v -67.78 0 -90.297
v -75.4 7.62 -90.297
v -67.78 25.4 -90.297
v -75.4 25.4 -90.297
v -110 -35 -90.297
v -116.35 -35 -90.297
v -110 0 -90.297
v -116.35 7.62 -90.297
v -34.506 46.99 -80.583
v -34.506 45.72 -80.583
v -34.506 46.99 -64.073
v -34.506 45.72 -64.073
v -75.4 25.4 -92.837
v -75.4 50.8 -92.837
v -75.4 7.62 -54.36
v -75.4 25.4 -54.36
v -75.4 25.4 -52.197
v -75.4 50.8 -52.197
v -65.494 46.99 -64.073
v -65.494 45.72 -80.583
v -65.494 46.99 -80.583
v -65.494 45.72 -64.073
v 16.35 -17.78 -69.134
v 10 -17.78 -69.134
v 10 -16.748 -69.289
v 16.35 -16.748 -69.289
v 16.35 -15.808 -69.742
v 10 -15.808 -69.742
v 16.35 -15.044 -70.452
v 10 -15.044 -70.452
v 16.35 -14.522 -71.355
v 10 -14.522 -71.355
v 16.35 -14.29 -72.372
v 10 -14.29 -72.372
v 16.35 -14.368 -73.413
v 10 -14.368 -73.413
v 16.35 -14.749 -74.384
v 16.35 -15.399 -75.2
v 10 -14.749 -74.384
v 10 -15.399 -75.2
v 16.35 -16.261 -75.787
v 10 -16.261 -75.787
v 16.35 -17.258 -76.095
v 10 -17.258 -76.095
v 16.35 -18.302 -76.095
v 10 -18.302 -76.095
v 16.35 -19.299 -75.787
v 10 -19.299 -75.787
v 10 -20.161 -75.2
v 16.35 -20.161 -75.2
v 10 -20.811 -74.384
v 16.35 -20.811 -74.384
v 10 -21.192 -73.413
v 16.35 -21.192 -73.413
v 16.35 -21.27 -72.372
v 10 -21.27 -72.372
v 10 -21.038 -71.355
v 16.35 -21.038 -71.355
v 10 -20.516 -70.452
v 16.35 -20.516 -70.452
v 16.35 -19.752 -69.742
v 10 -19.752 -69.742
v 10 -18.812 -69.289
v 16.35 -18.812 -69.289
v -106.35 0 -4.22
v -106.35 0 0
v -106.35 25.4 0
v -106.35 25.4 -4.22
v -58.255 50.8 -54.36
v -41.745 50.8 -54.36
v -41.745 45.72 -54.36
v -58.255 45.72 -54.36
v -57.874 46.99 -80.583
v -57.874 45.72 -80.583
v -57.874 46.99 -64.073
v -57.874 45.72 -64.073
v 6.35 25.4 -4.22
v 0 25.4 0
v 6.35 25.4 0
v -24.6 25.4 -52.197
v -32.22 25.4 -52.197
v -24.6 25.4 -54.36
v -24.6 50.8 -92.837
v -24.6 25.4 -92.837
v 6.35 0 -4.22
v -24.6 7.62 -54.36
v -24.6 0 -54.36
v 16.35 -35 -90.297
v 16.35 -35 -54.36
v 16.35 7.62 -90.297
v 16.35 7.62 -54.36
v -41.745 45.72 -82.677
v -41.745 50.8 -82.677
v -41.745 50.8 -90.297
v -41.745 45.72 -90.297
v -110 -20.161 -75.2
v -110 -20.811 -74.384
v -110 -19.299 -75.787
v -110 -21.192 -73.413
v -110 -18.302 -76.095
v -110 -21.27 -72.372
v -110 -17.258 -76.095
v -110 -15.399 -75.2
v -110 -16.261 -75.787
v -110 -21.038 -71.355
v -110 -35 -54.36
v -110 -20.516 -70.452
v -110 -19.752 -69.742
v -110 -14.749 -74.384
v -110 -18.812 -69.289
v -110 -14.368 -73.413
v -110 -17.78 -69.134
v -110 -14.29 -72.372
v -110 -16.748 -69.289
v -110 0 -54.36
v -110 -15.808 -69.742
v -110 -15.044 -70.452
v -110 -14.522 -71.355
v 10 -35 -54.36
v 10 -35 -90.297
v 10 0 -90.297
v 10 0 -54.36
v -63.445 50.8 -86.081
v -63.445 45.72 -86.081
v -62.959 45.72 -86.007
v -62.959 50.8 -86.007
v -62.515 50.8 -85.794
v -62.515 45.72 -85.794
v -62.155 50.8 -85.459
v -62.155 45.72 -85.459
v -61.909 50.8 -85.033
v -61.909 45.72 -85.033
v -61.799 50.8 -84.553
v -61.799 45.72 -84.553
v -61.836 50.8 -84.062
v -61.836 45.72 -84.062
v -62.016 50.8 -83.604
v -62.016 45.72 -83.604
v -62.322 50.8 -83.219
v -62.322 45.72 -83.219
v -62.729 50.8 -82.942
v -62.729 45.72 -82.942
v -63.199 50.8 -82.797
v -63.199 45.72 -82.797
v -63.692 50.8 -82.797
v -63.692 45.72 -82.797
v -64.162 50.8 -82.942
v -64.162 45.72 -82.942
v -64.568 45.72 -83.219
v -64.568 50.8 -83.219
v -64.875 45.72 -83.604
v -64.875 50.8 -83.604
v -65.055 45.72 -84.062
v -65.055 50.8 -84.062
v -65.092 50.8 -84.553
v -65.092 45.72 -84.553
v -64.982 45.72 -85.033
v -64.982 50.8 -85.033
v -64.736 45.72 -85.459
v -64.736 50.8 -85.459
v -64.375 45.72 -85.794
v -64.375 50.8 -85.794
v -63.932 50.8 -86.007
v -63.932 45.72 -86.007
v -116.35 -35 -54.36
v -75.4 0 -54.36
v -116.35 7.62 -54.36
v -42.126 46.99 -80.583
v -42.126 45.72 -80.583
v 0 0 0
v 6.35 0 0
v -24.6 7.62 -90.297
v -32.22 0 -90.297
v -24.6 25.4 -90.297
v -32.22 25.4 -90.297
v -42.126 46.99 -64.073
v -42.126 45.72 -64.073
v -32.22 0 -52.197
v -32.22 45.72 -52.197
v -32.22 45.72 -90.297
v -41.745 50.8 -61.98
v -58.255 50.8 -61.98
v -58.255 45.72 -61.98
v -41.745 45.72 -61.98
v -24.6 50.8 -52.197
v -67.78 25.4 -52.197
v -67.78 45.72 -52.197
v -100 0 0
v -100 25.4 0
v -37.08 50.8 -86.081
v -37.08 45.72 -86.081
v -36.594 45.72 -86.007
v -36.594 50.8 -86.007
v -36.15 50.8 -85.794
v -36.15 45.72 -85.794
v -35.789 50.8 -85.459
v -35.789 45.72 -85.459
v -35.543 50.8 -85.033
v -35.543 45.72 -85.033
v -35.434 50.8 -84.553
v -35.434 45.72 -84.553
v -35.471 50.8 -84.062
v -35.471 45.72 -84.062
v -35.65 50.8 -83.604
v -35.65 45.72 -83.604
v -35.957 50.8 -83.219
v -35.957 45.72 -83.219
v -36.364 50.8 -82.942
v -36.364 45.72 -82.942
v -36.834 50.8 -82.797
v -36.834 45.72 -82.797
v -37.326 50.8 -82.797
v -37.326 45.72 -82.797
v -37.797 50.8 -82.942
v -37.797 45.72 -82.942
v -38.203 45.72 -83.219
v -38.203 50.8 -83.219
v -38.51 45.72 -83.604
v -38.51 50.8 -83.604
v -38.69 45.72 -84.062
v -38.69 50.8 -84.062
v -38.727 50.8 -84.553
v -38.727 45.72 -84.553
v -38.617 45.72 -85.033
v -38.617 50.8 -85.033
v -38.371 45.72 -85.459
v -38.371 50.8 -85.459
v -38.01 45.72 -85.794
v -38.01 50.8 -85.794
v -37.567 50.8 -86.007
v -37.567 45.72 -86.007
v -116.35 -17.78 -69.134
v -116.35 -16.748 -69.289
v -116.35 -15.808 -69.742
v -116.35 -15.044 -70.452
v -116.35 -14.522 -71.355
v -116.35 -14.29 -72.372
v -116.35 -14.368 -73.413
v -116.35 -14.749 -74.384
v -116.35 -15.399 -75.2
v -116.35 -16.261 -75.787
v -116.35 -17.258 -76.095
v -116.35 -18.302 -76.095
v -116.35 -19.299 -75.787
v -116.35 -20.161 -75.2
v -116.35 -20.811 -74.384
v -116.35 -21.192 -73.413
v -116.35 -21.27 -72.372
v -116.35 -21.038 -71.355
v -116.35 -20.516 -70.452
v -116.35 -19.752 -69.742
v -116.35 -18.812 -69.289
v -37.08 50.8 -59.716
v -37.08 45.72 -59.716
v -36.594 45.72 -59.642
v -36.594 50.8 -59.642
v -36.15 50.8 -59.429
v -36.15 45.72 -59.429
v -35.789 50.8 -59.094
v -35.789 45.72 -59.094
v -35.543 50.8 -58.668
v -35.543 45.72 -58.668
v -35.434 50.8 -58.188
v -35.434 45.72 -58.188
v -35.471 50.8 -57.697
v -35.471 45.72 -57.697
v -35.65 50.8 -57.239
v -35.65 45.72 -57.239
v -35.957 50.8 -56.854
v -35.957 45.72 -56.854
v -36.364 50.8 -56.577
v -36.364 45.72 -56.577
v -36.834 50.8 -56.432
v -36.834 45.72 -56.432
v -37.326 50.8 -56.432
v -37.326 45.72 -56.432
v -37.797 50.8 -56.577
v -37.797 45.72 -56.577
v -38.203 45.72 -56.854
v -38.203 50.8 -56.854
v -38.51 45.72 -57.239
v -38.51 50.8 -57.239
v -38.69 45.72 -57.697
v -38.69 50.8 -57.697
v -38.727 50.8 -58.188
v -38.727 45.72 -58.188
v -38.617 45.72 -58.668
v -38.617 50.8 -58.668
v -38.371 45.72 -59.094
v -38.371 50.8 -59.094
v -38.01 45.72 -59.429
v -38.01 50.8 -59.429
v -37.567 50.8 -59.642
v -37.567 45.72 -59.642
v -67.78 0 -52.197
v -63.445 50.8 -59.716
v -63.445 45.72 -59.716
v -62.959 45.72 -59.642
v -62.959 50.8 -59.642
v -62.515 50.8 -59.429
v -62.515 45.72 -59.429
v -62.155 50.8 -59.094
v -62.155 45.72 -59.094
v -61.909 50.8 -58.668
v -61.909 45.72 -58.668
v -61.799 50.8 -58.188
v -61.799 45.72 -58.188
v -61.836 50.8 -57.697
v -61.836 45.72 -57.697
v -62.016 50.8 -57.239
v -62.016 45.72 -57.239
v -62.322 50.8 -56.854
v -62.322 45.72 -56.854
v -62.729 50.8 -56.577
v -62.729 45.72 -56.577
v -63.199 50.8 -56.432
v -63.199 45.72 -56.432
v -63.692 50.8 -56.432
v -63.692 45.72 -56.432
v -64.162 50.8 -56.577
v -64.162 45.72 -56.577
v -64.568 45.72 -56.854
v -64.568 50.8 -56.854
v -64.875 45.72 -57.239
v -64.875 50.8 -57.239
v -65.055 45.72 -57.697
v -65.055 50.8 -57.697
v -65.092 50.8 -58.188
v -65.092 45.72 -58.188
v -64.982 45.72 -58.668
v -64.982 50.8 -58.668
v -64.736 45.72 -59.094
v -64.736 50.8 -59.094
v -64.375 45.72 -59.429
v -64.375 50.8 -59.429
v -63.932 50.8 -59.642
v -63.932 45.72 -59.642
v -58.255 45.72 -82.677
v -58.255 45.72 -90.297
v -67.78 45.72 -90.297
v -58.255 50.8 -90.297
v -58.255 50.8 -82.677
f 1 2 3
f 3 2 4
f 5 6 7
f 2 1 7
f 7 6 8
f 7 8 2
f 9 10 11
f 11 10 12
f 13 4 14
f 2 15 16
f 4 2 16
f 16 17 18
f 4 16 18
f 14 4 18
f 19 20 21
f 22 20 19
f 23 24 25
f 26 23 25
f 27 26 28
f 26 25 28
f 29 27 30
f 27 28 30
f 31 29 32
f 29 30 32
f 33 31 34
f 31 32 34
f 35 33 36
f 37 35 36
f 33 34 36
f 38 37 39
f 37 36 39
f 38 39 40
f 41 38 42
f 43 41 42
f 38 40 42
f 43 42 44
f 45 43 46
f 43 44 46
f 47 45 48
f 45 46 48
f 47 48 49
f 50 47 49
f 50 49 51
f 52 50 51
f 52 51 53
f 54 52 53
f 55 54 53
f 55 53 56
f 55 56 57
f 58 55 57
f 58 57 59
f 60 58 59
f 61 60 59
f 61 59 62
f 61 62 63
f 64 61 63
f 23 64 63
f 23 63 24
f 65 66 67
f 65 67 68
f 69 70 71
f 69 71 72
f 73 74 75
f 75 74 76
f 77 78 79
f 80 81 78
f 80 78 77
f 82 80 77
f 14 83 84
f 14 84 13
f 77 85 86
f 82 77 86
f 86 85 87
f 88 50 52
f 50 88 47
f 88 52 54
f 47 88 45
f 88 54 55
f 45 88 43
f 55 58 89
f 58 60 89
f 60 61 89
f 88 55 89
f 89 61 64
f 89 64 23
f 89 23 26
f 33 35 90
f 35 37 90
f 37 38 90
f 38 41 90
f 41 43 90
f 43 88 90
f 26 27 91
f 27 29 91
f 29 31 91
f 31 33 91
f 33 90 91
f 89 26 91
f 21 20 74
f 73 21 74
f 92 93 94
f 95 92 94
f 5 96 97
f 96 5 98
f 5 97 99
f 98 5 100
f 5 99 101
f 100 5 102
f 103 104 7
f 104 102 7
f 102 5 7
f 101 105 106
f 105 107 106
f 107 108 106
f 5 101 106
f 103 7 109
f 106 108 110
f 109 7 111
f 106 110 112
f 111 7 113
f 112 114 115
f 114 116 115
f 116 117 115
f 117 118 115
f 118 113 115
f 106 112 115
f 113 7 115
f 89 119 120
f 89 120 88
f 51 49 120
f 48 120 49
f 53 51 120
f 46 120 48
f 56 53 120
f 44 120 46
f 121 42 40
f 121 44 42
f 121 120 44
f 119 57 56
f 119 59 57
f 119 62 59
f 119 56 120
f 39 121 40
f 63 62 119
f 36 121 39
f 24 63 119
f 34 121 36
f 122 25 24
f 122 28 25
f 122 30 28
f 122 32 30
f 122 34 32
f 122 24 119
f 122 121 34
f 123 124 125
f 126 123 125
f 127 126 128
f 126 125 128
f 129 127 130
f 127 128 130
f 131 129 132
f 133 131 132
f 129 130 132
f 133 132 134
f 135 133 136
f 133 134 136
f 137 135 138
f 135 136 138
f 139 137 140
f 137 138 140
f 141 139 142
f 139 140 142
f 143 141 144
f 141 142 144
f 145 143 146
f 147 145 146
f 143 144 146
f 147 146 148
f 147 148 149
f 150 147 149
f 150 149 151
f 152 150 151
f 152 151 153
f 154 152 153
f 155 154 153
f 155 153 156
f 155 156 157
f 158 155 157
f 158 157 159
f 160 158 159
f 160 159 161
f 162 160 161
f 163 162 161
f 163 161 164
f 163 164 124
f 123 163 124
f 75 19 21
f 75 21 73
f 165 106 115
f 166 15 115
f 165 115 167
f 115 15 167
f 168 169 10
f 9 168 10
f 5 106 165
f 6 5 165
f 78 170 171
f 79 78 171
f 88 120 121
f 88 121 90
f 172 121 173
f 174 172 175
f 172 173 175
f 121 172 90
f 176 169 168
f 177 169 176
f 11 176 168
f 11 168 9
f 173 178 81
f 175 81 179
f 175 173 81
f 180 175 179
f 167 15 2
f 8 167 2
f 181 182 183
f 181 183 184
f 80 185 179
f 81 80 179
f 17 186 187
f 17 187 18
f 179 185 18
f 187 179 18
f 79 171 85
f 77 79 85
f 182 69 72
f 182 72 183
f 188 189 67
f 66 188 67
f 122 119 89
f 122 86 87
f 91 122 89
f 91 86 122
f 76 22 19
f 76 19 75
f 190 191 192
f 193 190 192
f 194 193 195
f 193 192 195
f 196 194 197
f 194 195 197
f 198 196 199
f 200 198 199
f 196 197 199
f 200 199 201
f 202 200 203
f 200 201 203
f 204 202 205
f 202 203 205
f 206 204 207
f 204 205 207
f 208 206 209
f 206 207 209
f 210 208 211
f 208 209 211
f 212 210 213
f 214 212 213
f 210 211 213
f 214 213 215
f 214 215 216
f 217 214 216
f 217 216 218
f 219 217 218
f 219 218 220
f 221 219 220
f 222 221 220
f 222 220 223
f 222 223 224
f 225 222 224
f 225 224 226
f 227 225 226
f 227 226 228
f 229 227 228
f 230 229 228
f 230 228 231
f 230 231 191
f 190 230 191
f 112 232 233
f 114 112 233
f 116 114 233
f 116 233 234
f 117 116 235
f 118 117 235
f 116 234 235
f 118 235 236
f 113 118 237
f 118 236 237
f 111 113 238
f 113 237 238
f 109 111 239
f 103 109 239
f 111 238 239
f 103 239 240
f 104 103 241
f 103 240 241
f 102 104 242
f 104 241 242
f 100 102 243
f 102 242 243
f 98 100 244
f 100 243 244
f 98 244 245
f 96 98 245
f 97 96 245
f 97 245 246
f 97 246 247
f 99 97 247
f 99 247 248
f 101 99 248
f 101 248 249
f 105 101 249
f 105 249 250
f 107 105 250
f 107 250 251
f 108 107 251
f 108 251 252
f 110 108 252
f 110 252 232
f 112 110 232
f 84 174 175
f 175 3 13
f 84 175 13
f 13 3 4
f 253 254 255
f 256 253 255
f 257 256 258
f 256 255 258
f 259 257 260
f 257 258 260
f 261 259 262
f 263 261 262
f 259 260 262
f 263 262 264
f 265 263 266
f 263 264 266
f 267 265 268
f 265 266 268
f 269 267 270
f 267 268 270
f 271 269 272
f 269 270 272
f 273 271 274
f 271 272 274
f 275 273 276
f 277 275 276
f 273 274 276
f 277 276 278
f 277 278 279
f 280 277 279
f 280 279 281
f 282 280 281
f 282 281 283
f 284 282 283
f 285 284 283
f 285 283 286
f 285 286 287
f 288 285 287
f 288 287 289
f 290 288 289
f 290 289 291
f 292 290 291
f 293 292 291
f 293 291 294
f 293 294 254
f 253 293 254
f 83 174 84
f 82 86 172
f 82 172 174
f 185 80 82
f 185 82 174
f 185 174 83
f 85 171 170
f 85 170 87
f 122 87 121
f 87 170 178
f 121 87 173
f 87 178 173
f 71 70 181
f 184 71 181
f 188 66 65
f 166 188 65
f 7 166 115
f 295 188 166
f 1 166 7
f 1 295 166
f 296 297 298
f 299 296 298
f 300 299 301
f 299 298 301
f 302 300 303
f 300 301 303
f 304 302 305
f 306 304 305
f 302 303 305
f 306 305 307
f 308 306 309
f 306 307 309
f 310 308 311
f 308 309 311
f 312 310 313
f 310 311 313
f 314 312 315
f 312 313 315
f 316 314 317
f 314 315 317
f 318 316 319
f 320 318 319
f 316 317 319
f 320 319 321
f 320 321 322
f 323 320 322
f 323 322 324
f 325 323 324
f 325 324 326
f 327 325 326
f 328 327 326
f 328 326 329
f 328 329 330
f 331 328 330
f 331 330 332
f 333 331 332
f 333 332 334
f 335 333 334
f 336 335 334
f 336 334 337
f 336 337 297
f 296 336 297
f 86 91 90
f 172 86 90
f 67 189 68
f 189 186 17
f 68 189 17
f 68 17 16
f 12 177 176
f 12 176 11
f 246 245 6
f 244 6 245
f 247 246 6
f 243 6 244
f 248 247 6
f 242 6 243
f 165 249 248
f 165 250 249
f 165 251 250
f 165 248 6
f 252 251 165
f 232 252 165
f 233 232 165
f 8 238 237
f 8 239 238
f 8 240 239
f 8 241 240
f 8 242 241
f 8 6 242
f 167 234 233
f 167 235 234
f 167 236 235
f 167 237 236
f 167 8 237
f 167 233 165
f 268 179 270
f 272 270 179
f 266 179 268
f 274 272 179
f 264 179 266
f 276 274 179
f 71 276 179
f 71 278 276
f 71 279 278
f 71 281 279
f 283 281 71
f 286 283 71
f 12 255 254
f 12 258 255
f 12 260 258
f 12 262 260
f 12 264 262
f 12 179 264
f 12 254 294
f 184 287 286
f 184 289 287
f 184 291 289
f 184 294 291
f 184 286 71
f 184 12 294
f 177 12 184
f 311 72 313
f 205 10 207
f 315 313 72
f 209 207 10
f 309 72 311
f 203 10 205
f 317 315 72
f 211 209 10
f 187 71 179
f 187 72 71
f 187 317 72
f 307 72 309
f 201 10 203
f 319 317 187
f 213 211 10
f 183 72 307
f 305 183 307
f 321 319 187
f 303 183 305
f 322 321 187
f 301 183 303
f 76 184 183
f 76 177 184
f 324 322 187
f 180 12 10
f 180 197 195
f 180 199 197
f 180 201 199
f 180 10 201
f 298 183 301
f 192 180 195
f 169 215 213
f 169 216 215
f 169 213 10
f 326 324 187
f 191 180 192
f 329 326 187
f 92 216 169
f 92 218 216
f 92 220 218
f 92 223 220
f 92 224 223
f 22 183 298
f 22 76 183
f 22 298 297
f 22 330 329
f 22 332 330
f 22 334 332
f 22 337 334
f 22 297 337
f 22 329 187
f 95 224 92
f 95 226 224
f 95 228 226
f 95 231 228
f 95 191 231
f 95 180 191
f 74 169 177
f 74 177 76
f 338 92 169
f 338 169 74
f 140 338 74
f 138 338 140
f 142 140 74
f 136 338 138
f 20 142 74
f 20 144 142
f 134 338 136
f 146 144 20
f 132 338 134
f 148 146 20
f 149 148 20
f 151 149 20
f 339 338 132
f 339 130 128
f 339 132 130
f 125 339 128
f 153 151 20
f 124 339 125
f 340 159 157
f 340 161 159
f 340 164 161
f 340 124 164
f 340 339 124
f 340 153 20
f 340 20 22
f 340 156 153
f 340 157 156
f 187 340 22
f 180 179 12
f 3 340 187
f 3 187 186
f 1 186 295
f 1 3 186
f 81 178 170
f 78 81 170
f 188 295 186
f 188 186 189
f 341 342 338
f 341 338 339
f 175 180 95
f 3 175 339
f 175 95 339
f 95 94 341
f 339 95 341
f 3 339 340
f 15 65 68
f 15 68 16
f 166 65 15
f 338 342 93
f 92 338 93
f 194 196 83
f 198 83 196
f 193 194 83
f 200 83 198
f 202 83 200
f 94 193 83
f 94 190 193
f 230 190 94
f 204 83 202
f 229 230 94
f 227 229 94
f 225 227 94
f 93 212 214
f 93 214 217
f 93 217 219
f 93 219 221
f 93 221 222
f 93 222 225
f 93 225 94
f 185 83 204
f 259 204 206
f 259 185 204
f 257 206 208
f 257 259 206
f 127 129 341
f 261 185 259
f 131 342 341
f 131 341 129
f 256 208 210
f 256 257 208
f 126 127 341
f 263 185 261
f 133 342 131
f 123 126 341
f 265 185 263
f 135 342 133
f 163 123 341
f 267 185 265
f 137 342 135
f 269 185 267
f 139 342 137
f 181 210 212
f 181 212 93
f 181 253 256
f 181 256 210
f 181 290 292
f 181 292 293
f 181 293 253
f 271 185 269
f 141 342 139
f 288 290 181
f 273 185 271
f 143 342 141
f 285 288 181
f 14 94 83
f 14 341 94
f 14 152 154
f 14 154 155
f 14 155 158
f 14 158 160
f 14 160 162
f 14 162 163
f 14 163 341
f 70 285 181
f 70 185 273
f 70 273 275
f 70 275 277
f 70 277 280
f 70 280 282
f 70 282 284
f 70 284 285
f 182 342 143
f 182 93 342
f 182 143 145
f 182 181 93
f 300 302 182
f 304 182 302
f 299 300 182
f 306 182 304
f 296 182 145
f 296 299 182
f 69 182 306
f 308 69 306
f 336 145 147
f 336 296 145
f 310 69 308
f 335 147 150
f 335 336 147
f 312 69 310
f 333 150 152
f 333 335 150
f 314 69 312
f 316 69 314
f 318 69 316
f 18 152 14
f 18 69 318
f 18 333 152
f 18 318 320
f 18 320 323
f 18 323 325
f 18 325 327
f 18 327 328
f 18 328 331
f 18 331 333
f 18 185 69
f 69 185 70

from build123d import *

# Parameters (mm, degrees)
BOSS_EXTRUDE1_DEPTH  = 25.4
SKETCH7_W            = 35.937578614
SKETCH7_H            = 7.62
BOSS_EXTRUDE3_DEPTH  = 40.95
SKETCH8_W            = 6.35
SKETCH8_H            = 35.937578614
BOSS_EXTRUDE4_DEPTH  = 35
SKETCH9_W            = 7.62
SKETCH9_H            = 35.937578614
BOSS_EXTRUDE5_DEPTH  = 25.4
BOSS_EXTRUDE6_REACH  = 135.462
SKETCH10_W           = 35.937578614
SKETCH10_H           = 5.08
CUT_EXTRUDE1_REACH   = 172.448
SKETCH11_W           = 16.51
SKETCH11_H           = 7.62
BOSS_EXTRUDE7_DEPTH  = 2.162419
SKETCH14_W           = 50.8
SKETCH14_H           = 25.4
BOSS_EXTRUDE9_DEPTH  = 2.54
M6_CLEARANCE_HOLE2_D = 7
CUT_EXTRUDE2_REACH   = 171.327
SKETCH18_R           = 1.651
SKETCH19_W           = 7.62
SKETCH19_H           = 16.51
CUT_EXTRUDE4_DEPTH   = 1.27


with BuildPart() as part:
    # Sketch1 → Boss-Extrude1 (new body)
    with BuildSketch(Plane(origin=(0, 0, 0), x_dir=(1, 0, 0), z_dir=(0, 1, 0))):
        Polygon((6.35, 4.219850082), (-24.6, 54.359549401), (-24.6, 90.297128015), (-32.22, 90.297128015), (-32.22, 52.197128015), (0, 0), (6.35, 0), align=None)
    extrude(amount=BOSS_EXTRUDE1_DEPTH)

    # Sketch7 → Boss-Extrude3 (add)
    with BuildSketch(Plane(origin=(-24.6, 0, 0), x_dir=(0, 0, -1), z_dir=(1, 0, 0))):
        with Locations((72.328338708, 3.81)):
            Rectangle(SKETCH7_W, SKETCH7_H)
    extrude(amount=BOSS_EXTRUDE3_DEPTH)

    # Sketch8 → Boss-Extrude4 (add)
    with BuildSketch(Plane.XZ):
        with Locations((13.175, -72.328338708)):
            Rectangle(SKETCH8_W, SKETCH8_H)
    extrude(amount=BOSS_EXTRUDE4_DEPTH)


with BuildPart() as body_2:
    # Mirror6: mirrored copy
    add(part.part.mirror(Plane.ZY.offset(50)))


with BuildPart() as part_1:
    add(part.part)

    add(body_2.part)  # Boss-Extrude5 merges body 2
    # Sketch9 → Boss-Extrude5 (add)
    with BuildSketch(Plane(origin=(0, 25.4, 0), x_dir=(1, 0, 0), z_dir=(0, 1, 0))):
        with Locations((-71.59, 72.328338708)):
            Rectangle(SKETCH9_W, SKETCH9_H)
        with Locations((-28.41, 72.328338708)):
            Rectangle(SKETCH9_W, SKETCH9_H)
    extrude(amount=BOSS_EXTRUDE5_DEPTH)

    # Sketch10 → Boss-Extrude6 (add, up to next)
    with BuildSketch(Plane(origin=(-67.78, 0, 0), x_dir=(0, 0, -1), z_dir=(1, 0, 0)), mode=Mode.PRIVATE) as boss_extrude6_sk1:
        with Locations((72.328338708, 48.26)):
            Rectangle(SKETCH10_W, SKETCH10_H)
    boss_extrude6_tool1 = extrude(boss_extrude6_sk1.sketch, amount=BOSS_EXTRUDE6_REACH, mode=Mode.PRIVATE) - part_1.part
    add(boss_extrude6_tool1.solids().sort_by_distance((-67.78, 48.26, -72.328339))[0])

    # Sketch11 → Cut-Extrude1 (cut, up to next)
    with BuildSketch(Plane(origin=(0, 50.8, 0), x_dir=(1, 0, 0), z_dir=(0, 1, 0)), mode=Mode.PRIVATE) as cut_extrude1_sk1:
        with Locations((-50, 58.169549401)):
            Rectangle(SKETCH11_W, SKETCH11_H)
    cut_extrude1_tool1 = extrude(cut_extrude1_sk1.sketch, amount=-CUT_EXTRUDE1_REACH, mode=Mode.PRIVATE) & part_1.part
    # Sketch11 → Cut-Extrude1 (cut, up to next)
    with BuildSketch(Plane(origin=(0, 50.8, 0), x_dir=(1, 0, 0), z_dir=(0, 1, 0)), mode=Mode.PRIVATE) as cut_extrude1_sk2:
        with Locations((-50, 86.487128015)):
            Rectangle(SKETCH11_W, SKETCH11_H)
    cut_extrude1_tool2 = extrude(cut_extrude1_sk2.sketch, amount=-CUT_EXTRUDE1_REACH, mode=Mode.PRIVATE) & part_1.part
    add(cut_extrude1_tool1.solids().sort_by_distance((-50, 50.8, -58.169549))[0], mode=Mode.SUBTRACT)
    add(cut_extrude1_tool2.solids().sort_by_distance((-50, 50.8, -86.487128))[0], mode=Mode.SUBTRACT)

    # Sketch12 → Boss-Extrude7 (add)
    with BuildSketch(Plane.XY.offset(-54.359549401)):
        Polygon((-75.4, 50.8), (-24.6, 50.8), (-24.6, 25.4), (-32.22, 25.4), (-32.22, 45.72), (-67.78, 45.72), (-67.78, 25.4), (-75.4, 25.4), align=None)
    extrude(amount=BOSS_EXTRUDE7_DEPTH)

    # Sketch14 → Boss-Extrude9 (add)
    with BuildSketch(Plane(origin=(0, 0, -90.297128015), x_dir=(-1, 0, 0), z_dir=(0, 0, -1))):
        with Locations((50, 38.1)):
            Rectangle(SKETCH14_W, SKETCH14_H)
    extrude(amount=BOSS_EXTRUDE9_DEPTH)

    # M6 Clearance Hole2 (through all)
    with Locations(Plane(origin=(16.35, 0, 0), x_dir=(0, 0, -1), z_dir=(1, 0, 0))):
        with Locations((72.633968015, -17.78)):
            Hole(M6_CLEARANCE_HOLE2_D / 2)

    # Sketch18 → Cut-Extrude2 (cut, up to next)
    with BuildSketch(Plane(origin=(0, 45.72, 0), x_dir=(-1, 0, 0), z_dir=(0, -1, 0)), mode=Mode.PRIVATE) as cut_extrude2_sk1:
        with Locations(Location((37.080244901, 58.064528015, 0), (0, 0, 90))):
            Circle(SKETCH18_R)
    cut_extrude2_tool1 = extrude(cut_extrude2_sk1.sketch, amount=-CUT_EXTRUDE2_REACH, mode=Mode.PRIVATE) & part_1.part
    # Sketch18 → Cut-Extrude2 (cut, up to next)
    with BuildSketch(Plane(origin=(0, 45.72, 0), x_dir=(-1, 0, 0), z_dir=(0, -1, 0)), mode=Mode.PRIVATE) as cut_extrude2_sk2:
        with Locations(Location((63.445444901, 58.064528015, 0), (0, 0, 90))):
            Circle(SKETCH18_R)
    cut_extrude2_tool2 = extrude(cut_extrude2_sk2.sketch, amount=-CUT_EXTRUDE2_REACH, mode=Mode.PRIVATE) & part_1.part
    # Sketch18 → Cut-Extrude2 (cut, up to next)
    with BuildSketch(Plane(origin=(0, 45.72, 0), x_dir=(-1, 0, 0), z_dir=(0, -1, 0)), mode=Mode.PRIVATE) as cut_extrude2_sk3:
        with Locations(Location((63.445444901, 84.429728015, 0), (0, 0, 90))):
            Circle(SKETCH18_R)
    cut_extrude2_tool3 = extrude(cut_extrude2_sk3.sketch, amount=-CUT_EXTRUDE2_REACH, mode=Mode.PRIVATE) & part_1.part
    # Sketch18 → Cut-Extrude2 (cut, up to next)
    with BuildSketch(Plane(origin=(0, 45.72, 0), x_dir=(-1, 0, 0), z_dir=(0, -1, 0)), mode=Mode.PRIVATE) as cut_extrude2_sk4:
        with Locations(Location((37.080244901, 84.429728015, 0), (0, 0, 90))):
            Circle(SKETCH18_R)
    cut_extrude2_tool4 = extrude(cut_extrude2_sk4.sketch, amount=-CUT_EXTRUDE2_REACH, mode=Mode.PRIVATE) & part_1.part
    add(cut_extrude2_tool1.solids().sort_by_distance((-37.080245, 45.72, -58.064528))[0], mode=Mode.SUBTRACT)
    add(cut_extrude2_tool2.solids().sort_by_distance((-63.445445, 45.72, -58.064528))[0], mode=Mode.SUBTRACT)
    add(cut_extrude2_tool3.solids().sort_by_distance((-63.445445, 45.72, -84.429728))[0], mode=Mode.SUBTRACT)
    add(cut_extrude2_tool4.solids().sort_by_distance((-37.080245, 45.72, -84.429728))[0], mode=Mode.SUBTRACT)

    # Sketch19 → Cut-Extrude4 (cut)
    with BuildSketch(Plane.XZ.offset(-45.72)):
        with Locations((-38.316, -72.327898015)):
            Rectangle(SKETCH19_W, SKETCH19_H)
        with Locations((-61.684, -72.327898015)):
            Rectangle(SKETCH19_W, SKETCH19_H)
    extrude(amount=-CUT_EXTRUDE4_DEPTH, mode=Mode.SUBTRACT)


solid = part_1.part
